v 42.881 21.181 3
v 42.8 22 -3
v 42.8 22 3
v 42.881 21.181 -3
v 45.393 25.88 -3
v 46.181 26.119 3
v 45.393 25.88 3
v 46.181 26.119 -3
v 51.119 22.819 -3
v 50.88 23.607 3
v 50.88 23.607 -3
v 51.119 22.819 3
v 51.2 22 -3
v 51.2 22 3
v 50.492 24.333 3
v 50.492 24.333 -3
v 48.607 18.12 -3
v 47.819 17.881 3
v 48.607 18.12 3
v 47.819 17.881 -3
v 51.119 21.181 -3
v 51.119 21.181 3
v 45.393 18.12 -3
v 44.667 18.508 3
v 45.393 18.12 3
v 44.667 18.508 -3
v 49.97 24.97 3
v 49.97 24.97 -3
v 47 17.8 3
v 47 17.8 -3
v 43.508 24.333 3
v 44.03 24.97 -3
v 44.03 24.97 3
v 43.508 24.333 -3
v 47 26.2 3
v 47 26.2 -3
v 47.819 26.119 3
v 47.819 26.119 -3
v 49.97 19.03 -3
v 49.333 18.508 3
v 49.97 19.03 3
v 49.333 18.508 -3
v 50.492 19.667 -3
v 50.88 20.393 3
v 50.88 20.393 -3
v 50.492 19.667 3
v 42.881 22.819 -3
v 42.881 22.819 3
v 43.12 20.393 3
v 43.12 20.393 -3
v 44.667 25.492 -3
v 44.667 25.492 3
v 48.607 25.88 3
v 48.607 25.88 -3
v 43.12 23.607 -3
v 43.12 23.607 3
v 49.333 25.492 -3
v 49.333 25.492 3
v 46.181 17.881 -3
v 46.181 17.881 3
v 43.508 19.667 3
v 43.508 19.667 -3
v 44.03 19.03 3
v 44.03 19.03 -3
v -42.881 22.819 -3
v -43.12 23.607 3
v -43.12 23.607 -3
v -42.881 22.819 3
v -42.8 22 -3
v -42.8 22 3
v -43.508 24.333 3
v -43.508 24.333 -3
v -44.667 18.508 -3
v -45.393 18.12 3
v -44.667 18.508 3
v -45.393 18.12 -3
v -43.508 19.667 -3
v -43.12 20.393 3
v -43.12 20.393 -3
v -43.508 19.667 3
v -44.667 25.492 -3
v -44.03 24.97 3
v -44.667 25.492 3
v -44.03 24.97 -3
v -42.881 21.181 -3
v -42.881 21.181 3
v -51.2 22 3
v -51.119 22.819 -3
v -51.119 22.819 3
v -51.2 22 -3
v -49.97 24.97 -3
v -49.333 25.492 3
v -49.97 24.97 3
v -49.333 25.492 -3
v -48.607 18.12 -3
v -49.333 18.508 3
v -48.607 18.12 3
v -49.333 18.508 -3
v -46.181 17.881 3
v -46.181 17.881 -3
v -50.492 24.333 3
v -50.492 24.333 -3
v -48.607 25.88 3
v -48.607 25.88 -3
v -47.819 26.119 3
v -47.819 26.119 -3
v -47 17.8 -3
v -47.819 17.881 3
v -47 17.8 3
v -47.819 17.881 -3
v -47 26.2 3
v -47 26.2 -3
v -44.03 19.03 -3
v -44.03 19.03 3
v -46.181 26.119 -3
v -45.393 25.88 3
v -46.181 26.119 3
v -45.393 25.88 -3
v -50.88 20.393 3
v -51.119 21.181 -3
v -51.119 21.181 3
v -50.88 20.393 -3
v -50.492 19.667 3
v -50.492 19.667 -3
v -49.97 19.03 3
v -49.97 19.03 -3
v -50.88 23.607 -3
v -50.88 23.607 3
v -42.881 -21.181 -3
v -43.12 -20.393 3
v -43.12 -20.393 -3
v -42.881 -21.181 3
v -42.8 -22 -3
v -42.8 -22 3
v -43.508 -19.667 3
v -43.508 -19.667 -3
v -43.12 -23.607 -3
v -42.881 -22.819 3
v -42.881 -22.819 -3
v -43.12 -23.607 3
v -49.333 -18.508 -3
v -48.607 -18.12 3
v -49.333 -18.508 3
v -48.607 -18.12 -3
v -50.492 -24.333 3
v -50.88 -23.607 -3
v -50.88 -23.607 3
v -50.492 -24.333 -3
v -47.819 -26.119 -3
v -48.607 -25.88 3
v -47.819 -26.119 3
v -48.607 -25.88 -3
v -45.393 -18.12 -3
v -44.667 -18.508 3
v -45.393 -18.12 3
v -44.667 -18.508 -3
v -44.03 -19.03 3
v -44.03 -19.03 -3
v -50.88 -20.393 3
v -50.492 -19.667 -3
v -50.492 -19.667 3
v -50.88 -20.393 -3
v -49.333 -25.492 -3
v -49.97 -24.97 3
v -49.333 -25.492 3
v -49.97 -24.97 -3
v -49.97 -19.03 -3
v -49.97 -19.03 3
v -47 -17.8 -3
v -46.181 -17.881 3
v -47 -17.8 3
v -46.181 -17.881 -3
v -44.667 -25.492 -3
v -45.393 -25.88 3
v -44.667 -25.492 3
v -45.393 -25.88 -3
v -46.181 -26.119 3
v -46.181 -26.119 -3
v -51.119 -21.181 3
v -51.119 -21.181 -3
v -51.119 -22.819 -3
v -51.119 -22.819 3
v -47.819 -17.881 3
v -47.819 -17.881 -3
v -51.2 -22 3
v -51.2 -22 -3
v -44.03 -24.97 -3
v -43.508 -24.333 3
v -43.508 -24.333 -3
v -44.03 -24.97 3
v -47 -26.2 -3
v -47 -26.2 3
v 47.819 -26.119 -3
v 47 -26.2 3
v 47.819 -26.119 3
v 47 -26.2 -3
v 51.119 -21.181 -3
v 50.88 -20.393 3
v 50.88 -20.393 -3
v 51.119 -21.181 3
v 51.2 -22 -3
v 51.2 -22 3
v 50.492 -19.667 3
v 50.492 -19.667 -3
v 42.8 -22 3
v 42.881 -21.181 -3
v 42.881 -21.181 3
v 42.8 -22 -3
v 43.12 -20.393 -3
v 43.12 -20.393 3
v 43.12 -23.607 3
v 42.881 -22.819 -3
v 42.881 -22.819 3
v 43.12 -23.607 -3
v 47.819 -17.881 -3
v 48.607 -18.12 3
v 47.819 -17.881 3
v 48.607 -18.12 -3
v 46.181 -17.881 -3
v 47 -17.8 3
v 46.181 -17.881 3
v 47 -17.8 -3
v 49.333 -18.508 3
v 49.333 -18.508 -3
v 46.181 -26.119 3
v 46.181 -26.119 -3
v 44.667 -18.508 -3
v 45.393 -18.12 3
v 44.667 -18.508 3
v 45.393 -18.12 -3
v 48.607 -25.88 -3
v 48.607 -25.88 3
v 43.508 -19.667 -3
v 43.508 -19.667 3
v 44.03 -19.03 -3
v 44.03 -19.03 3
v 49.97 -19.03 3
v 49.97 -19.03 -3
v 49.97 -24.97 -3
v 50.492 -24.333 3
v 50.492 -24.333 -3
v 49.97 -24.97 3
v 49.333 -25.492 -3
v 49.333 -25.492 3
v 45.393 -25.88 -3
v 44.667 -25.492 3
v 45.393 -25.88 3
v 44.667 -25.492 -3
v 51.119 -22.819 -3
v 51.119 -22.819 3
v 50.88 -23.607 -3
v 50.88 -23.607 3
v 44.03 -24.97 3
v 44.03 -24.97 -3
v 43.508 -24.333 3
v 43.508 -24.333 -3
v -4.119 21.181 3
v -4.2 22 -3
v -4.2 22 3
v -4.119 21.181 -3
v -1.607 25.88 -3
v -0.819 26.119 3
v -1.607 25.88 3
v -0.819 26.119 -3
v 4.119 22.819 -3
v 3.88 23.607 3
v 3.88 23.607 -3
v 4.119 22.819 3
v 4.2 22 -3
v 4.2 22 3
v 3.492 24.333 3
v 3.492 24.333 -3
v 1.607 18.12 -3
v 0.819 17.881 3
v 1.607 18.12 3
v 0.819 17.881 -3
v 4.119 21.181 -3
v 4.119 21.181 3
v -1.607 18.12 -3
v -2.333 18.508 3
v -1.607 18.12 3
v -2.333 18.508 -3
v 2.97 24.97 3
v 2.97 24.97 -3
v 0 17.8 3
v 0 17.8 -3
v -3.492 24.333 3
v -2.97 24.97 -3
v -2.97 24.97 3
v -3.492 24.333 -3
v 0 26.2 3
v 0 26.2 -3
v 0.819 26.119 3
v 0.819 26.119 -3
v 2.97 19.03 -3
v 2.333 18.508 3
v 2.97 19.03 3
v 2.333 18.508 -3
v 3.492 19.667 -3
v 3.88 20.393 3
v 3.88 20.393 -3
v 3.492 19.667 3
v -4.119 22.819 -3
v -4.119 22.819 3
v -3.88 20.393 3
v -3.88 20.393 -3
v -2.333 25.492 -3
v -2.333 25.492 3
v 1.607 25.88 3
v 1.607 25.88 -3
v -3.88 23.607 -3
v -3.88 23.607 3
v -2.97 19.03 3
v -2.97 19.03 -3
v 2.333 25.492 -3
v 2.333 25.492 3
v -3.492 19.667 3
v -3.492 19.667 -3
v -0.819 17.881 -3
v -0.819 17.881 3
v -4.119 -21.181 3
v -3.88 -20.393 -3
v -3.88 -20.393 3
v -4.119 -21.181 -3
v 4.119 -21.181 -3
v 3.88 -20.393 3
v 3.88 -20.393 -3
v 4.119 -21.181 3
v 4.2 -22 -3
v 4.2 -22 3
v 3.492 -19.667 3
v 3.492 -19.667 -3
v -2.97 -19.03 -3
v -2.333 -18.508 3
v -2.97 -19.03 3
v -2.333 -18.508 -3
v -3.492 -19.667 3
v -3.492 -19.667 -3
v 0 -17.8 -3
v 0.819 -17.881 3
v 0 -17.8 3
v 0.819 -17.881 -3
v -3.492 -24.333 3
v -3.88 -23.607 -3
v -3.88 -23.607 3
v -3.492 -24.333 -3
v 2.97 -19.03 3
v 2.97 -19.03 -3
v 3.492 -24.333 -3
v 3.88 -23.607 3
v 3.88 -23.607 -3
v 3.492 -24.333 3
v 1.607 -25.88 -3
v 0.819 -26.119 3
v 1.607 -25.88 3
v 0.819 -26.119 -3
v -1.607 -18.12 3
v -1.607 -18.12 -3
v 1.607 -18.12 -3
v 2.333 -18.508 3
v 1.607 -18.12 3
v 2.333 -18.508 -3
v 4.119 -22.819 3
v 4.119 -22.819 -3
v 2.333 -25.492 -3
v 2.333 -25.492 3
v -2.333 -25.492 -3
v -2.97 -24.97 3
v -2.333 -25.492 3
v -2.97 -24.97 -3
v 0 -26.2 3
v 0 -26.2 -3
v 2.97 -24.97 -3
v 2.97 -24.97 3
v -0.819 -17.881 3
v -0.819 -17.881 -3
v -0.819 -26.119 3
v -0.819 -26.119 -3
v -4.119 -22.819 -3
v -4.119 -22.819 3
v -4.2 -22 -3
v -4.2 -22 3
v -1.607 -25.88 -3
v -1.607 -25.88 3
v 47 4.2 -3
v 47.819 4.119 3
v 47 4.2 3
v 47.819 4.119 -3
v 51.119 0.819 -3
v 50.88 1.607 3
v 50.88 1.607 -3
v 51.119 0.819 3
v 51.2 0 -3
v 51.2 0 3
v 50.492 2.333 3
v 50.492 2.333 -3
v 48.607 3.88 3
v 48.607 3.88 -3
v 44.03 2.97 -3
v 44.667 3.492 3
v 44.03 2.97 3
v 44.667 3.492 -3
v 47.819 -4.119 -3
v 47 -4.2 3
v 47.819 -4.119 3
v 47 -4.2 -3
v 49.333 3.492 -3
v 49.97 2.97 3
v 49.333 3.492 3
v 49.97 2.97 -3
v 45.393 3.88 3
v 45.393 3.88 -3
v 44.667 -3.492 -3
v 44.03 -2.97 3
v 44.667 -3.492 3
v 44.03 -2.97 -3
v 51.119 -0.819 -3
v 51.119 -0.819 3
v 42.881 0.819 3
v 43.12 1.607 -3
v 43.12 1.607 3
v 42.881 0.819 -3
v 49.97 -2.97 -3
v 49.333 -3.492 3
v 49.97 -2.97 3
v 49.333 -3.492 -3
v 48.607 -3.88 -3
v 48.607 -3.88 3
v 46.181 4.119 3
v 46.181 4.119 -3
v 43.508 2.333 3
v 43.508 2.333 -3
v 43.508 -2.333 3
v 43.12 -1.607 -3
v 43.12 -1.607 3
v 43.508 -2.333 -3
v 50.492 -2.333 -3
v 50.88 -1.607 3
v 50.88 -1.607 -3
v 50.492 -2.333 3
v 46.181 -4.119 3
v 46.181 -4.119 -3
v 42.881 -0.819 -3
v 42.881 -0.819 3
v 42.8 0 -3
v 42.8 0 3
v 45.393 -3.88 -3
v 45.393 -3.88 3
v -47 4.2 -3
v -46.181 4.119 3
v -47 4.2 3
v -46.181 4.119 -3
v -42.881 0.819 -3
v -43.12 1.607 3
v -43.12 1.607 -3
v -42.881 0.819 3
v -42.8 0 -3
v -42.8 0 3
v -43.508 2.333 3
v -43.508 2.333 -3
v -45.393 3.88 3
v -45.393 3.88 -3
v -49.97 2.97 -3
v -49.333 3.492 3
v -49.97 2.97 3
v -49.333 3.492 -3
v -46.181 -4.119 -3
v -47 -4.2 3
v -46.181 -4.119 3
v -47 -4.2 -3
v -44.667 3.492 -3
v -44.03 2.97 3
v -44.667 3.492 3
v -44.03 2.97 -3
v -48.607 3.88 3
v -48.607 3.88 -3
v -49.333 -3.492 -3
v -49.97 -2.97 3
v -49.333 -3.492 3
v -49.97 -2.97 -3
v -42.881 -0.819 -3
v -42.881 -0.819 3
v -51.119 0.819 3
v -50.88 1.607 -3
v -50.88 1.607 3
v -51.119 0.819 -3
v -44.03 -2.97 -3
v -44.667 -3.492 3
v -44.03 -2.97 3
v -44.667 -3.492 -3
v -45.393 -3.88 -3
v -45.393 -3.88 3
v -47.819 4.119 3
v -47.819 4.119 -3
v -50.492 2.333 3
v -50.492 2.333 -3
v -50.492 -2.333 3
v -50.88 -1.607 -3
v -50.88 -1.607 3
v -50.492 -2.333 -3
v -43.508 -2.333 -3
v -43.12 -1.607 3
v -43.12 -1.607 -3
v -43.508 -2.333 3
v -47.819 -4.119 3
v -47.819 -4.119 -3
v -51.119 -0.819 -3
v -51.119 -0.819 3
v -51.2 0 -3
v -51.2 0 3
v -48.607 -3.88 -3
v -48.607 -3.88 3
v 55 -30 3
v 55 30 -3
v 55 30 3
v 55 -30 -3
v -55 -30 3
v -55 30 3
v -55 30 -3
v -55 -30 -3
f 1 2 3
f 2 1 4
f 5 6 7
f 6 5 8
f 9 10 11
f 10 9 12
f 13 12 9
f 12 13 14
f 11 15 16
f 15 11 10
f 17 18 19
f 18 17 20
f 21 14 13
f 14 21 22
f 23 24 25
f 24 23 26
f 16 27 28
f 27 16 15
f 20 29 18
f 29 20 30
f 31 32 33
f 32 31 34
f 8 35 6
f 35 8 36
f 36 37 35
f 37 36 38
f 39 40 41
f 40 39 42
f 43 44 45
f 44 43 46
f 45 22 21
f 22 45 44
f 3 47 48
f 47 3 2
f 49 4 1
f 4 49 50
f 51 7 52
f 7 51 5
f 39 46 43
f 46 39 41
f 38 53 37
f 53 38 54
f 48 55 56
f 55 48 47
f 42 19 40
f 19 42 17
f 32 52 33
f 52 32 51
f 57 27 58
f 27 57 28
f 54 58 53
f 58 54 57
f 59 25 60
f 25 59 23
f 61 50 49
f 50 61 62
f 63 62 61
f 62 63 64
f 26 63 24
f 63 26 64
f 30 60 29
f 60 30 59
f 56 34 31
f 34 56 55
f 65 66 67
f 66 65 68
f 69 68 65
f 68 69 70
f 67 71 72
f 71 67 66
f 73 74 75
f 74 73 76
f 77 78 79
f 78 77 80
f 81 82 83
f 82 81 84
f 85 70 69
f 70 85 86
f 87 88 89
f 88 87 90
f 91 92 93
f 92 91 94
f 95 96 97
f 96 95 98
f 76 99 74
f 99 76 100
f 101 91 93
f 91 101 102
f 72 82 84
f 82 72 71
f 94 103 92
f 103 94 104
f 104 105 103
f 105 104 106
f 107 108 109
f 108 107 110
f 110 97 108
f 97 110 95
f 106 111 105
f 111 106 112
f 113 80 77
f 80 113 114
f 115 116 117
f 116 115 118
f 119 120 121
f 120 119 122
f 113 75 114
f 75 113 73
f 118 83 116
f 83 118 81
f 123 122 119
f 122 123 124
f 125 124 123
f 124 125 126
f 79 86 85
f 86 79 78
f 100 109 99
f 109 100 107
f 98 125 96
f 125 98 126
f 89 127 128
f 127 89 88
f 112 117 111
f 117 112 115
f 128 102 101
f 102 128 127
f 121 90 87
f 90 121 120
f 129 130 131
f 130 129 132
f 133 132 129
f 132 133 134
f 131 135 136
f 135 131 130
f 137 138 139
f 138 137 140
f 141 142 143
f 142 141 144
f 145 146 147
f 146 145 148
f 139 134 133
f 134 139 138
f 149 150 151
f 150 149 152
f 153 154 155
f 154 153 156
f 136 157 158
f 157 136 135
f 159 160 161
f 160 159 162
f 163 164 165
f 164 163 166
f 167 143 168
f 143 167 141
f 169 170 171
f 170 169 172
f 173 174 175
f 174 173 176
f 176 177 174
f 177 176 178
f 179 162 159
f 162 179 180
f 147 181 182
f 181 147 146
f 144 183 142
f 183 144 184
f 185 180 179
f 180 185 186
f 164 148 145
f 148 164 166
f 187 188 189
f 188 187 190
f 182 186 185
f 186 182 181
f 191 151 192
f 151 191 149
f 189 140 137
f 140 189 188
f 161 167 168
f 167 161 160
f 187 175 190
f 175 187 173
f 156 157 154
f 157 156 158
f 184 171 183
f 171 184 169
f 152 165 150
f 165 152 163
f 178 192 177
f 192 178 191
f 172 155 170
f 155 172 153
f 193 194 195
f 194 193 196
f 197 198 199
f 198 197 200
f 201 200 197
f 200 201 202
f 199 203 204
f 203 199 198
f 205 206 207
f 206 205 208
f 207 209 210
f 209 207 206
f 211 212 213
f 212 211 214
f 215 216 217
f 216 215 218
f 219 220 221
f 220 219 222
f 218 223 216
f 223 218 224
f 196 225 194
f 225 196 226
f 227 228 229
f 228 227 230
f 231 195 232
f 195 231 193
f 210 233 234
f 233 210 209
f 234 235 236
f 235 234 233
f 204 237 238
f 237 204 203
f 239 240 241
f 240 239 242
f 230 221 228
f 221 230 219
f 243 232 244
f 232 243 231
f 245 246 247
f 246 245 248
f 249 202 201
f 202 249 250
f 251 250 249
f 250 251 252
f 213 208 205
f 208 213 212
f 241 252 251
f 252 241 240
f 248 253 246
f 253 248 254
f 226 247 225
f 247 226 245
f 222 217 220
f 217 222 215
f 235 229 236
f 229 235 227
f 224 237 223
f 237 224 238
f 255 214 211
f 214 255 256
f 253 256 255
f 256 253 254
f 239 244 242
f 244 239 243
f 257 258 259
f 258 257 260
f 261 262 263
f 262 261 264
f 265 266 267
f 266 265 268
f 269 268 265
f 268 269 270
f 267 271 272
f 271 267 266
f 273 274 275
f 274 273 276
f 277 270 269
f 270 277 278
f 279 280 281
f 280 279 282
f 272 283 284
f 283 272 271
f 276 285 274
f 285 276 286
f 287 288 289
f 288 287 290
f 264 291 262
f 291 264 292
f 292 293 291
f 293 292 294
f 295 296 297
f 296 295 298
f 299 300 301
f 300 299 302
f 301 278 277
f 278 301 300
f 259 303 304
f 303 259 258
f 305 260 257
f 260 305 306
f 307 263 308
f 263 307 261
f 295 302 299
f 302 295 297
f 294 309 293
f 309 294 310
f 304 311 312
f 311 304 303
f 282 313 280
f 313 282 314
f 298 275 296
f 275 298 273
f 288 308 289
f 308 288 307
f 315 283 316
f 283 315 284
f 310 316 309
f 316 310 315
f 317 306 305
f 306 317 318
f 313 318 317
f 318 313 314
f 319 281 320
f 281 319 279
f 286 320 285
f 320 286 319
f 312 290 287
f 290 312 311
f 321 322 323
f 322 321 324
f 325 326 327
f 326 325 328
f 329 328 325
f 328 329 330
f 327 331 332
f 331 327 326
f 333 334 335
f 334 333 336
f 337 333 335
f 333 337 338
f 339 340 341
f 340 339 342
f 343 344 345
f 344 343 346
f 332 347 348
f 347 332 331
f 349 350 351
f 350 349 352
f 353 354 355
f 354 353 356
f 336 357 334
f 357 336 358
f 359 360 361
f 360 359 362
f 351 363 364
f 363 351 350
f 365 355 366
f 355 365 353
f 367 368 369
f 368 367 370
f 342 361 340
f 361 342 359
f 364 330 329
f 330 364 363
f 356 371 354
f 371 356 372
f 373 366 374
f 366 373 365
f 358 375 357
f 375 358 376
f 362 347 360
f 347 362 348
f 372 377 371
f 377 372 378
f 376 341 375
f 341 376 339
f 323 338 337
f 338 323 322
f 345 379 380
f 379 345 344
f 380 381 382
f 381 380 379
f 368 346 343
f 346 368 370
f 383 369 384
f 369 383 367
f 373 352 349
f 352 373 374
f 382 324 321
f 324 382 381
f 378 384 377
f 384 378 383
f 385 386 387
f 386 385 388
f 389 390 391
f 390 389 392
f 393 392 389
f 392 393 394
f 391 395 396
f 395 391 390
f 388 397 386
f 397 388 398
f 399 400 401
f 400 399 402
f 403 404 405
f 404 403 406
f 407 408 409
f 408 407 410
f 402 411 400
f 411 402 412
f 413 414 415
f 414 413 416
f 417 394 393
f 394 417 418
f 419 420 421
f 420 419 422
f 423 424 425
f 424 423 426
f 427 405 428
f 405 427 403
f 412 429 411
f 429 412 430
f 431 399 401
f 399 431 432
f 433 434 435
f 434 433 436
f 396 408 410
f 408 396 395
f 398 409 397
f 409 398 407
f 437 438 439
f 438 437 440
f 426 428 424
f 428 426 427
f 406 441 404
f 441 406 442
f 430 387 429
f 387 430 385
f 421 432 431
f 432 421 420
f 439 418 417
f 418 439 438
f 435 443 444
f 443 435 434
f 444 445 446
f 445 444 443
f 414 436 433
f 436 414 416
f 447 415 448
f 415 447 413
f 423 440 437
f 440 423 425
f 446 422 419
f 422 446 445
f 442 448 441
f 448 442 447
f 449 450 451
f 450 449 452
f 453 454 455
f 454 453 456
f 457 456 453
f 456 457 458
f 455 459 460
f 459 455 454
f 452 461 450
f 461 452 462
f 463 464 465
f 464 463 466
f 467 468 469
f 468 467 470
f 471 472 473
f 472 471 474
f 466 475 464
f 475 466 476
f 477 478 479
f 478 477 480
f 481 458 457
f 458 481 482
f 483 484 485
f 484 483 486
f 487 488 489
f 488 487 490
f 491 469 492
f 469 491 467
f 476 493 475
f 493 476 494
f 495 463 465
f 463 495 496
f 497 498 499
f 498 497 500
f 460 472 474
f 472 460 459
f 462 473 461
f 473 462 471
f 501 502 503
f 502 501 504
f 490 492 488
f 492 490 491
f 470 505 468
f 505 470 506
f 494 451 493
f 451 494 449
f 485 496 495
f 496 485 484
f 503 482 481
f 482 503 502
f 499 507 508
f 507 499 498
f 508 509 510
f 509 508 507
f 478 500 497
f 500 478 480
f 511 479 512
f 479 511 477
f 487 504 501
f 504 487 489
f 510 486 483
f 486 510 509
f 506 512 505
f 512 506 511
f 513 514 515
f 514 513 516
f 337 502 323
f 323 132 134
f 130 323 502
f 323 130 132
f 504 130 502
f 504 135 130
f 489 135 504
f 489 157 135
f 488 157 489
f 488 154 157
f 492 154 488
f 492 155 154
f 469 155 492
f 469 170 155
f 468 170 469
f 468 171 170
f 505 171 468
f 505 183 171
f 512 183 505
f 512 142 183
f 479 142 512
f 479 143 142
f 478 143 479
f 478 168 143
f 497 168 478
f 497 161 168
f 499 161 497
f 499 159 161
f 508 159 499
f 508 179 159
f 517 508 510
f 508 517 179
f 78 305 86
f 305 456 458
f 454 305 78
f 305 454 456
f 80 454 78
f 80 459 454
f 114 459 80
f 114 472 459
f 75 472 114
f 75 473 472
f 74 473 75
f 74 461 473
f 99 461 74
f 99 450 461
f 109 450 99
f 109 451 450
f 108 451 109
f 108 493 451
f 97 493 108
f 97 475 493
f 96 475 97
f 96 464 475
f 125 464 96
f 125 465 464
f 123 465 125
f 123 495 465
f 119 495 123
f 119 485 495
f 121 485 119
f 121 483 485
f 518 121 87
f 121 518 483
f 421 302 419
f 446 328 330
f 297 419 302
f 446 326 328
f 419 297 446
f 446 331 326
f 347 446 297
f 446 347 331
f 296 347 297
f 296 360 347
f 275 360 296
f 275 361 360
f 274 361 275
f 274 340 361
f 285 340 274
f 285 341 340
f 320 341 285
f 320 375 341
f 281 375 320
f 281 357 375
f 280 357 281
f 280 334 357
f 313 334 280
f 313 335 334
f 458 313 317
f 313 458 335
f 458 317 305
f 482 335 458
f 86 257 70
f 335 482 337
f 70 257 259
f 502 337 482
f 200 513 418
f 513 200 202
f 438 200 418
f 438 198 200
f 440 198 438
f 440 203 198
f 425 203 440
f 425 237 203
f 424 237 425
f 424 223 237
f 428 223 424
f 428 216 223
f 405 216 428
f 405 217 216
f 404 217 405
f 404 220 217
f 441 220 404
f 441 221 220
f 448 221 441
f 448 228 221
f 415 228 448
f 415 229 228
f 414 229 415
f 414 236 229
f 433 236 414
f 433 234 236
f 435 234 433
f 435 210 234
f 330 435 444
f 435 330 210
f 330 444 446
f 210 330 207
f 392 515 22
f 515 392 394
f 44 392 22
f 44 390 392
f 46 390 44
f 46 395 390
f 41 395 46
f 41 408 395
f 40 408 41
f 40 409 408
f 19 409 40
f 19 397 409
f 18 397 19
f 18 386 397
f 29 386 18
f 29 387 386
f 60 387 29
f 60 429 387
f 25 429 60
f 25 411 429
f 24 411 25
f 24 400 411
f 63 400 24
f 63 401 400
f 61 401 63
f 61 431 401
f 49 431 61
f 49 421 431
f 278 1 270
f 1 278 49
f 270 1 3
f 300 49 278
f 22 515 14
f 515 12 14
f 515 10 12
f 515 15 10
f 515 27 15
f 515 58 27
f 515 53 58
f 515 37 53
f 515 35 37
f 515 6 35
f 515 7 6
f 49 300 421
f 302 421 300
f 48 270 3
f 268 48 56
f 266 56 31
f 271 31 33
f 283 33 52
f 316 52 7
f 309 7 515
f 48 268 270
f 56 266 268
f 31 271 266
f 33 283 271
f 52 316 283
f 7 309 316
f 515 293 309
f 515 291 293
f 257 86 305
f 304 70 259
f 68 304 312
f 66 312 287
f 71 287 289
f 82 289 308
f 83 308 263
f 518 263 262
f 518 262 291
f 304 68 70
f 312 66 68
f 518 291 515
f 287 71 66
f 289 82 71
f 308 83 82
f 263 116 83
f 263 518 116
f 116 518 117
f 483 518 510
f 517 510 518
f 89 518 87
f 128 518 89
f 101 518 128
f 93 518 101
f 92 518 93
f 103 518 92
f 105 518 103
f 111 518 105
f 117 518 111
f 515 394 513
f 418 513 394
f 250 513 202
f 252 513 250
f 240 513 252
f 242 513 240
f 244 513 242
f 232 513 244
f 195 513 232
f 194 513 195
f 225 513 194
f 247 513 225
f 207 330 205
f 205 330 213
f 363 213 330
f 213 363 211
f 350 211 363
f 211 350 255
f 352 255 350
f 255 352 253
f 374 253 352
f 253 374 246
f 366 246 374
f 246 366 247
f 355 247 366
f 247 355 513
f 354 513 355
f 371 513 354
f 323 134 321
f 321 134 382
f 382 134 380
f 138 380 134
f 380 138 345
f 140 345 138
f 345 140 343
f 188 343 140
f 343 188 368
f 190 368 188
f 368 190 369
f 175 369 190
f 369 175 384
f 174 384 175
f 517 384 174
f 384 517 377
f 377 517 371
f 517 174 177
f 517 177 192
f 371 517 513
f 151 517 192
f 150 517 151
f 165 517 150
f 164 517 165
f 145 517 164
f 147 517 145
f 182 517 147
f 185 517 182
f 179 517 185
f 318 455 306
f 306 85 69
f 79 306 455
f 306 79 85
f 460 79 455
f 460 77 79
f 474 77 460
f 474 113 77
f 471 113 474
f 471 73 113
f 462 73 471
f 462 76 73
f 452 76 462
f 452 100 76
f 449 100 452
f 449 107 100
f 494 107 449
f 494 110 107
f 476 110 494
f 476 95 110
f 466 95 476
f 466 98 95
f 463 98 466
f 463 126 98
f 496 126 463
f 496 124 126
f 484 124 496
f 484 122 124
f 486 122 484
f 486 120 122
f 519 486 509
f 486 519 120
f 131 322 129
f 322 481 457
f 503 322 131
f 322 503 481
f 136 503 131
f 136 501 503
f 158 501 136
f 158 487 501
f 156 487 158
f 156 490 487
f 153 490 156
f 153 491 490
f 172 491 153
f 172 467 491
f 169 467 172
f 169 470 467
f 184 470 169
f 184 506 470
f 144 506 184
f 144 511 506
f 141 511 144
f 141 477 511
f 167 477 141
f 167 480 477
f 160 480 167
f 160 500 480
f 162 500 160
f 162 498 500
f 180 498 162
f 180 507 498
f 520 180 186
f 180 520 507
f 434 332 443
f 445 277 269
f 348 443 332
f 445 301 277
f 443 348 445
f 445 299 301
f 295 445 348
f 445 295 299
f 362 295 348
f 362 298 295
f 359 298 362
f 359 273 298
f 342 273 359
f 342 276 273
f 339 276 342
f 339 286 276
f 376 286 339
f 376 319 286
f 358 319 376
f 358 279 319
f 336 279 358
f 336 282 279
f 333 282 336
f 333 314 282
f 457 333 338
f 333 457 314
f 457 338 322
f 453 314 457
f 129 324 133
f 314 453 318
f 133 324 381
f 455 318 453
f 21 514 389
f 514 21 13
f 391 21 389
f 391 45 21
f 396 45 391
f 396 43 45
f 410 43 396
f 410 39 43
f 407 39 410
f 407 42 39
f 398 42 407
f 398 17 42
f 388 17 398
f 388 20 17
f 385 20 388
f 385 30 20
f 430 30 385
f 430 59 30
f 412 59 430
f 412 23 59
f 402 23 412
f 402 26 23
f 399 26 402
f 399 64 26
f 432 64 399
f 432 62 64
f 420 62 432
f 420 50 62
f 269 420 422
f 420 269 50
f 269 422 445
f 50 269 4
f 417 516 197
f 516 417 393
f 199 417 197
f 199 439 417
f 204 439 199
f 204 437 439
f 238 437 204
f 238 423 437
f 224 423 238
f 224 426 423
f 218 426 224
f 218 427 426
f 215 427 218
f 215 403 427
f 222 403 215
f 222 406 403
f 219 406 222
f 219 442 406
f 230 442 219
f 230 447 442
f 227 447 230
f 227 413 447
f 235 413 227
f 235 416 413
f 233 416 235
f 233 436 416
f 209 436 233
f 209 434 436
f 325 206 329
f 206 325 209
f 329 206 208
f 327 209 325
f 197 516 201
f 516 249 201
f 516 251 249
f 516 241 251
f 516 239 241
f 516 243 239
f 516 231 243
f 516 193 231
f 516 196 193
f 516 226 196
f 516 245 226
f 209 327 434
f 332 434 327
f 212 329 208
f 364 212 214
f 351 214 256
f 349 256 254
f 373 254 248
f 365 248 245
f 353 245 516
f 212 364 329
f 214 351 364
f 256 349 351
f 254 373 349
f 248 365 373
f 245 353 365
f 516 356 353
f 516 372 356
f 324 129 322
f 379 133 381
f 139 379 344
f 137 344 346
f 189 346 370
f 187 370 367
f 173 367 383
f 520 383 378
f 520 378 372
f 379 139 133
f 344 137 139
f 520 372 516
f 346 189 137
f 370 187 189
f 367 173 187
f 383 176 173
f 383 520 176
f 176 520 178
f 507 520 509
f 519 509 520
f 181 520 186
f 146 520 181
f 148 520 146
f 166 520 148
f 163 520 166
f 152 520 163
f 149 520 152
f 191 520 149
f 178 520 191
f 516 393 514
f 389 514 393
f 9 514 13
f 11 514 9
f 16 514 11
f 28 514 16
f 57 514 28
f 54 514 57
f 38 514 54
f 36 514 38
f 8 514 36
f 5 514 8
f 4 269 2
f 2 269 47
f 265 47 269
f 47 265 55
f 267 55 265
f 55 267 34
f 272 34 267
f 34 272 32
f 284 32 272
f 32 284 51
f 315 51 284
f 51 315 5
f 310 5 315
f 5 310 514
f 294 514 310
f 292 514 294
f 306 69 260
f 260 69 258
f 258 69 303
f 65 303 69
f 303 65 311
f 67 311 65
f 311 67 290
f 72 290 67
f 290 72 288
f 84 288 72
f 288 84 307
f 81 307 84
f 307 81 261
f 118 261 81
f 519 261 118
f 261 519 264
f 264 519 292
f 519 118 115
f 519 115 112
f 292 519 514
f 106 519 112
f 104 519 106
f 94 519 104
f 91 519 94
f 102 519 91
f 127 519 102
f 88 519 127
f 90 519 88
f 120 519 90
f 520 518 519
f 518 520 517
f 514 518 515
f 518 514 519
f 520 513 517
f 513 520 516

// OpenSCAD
$fn = 32;

// ----------------------------------------------------------------------
// Corner plate 110 x 60 x 6
// 8 holes, centres taken from the edge offset
// ----------------------------------------------------------------------

// --- parameters (mm) ---
plate = [110, 60, 6];  // overall size (x, y, z)
seat_tol = 0.15;       // tolerance at the seating features
free_tol = 0.5;        // general tolerance on the free sizes
holes = 8;             // number of holes the drawing asks for
hole_d = 8.4;          // hole diameter
edge = 8;              // hole centre offset from the plate edge

// --- derived feature positions (mm) ---
corner_x = plate[0] / 2 - edge;  // = 47   corner hole X
corner_y = plate[1] / 2 - edge;  // = 22   corner hole Y
feature_centers = [
  [corner_x, corner_y],
  [-corner_x, corner_y],
  [-corner_x, -corner_y],
  [corner_x, -corner_y],
  [0, corner_y],
  [0, -corner_y],
  [corner_x, 0],
  [-corner_x, 0]
];   // hole centres the loop below drills

// plate outline, every hole drilled through with the same cutters
difference() {
  cube(plate, center = true);
  for (centre = feature_centers)
    translate([centre[0], centre[1], 0])
      cylinder(d = hole_d, h = plate[2] + 2, center = true);
}
